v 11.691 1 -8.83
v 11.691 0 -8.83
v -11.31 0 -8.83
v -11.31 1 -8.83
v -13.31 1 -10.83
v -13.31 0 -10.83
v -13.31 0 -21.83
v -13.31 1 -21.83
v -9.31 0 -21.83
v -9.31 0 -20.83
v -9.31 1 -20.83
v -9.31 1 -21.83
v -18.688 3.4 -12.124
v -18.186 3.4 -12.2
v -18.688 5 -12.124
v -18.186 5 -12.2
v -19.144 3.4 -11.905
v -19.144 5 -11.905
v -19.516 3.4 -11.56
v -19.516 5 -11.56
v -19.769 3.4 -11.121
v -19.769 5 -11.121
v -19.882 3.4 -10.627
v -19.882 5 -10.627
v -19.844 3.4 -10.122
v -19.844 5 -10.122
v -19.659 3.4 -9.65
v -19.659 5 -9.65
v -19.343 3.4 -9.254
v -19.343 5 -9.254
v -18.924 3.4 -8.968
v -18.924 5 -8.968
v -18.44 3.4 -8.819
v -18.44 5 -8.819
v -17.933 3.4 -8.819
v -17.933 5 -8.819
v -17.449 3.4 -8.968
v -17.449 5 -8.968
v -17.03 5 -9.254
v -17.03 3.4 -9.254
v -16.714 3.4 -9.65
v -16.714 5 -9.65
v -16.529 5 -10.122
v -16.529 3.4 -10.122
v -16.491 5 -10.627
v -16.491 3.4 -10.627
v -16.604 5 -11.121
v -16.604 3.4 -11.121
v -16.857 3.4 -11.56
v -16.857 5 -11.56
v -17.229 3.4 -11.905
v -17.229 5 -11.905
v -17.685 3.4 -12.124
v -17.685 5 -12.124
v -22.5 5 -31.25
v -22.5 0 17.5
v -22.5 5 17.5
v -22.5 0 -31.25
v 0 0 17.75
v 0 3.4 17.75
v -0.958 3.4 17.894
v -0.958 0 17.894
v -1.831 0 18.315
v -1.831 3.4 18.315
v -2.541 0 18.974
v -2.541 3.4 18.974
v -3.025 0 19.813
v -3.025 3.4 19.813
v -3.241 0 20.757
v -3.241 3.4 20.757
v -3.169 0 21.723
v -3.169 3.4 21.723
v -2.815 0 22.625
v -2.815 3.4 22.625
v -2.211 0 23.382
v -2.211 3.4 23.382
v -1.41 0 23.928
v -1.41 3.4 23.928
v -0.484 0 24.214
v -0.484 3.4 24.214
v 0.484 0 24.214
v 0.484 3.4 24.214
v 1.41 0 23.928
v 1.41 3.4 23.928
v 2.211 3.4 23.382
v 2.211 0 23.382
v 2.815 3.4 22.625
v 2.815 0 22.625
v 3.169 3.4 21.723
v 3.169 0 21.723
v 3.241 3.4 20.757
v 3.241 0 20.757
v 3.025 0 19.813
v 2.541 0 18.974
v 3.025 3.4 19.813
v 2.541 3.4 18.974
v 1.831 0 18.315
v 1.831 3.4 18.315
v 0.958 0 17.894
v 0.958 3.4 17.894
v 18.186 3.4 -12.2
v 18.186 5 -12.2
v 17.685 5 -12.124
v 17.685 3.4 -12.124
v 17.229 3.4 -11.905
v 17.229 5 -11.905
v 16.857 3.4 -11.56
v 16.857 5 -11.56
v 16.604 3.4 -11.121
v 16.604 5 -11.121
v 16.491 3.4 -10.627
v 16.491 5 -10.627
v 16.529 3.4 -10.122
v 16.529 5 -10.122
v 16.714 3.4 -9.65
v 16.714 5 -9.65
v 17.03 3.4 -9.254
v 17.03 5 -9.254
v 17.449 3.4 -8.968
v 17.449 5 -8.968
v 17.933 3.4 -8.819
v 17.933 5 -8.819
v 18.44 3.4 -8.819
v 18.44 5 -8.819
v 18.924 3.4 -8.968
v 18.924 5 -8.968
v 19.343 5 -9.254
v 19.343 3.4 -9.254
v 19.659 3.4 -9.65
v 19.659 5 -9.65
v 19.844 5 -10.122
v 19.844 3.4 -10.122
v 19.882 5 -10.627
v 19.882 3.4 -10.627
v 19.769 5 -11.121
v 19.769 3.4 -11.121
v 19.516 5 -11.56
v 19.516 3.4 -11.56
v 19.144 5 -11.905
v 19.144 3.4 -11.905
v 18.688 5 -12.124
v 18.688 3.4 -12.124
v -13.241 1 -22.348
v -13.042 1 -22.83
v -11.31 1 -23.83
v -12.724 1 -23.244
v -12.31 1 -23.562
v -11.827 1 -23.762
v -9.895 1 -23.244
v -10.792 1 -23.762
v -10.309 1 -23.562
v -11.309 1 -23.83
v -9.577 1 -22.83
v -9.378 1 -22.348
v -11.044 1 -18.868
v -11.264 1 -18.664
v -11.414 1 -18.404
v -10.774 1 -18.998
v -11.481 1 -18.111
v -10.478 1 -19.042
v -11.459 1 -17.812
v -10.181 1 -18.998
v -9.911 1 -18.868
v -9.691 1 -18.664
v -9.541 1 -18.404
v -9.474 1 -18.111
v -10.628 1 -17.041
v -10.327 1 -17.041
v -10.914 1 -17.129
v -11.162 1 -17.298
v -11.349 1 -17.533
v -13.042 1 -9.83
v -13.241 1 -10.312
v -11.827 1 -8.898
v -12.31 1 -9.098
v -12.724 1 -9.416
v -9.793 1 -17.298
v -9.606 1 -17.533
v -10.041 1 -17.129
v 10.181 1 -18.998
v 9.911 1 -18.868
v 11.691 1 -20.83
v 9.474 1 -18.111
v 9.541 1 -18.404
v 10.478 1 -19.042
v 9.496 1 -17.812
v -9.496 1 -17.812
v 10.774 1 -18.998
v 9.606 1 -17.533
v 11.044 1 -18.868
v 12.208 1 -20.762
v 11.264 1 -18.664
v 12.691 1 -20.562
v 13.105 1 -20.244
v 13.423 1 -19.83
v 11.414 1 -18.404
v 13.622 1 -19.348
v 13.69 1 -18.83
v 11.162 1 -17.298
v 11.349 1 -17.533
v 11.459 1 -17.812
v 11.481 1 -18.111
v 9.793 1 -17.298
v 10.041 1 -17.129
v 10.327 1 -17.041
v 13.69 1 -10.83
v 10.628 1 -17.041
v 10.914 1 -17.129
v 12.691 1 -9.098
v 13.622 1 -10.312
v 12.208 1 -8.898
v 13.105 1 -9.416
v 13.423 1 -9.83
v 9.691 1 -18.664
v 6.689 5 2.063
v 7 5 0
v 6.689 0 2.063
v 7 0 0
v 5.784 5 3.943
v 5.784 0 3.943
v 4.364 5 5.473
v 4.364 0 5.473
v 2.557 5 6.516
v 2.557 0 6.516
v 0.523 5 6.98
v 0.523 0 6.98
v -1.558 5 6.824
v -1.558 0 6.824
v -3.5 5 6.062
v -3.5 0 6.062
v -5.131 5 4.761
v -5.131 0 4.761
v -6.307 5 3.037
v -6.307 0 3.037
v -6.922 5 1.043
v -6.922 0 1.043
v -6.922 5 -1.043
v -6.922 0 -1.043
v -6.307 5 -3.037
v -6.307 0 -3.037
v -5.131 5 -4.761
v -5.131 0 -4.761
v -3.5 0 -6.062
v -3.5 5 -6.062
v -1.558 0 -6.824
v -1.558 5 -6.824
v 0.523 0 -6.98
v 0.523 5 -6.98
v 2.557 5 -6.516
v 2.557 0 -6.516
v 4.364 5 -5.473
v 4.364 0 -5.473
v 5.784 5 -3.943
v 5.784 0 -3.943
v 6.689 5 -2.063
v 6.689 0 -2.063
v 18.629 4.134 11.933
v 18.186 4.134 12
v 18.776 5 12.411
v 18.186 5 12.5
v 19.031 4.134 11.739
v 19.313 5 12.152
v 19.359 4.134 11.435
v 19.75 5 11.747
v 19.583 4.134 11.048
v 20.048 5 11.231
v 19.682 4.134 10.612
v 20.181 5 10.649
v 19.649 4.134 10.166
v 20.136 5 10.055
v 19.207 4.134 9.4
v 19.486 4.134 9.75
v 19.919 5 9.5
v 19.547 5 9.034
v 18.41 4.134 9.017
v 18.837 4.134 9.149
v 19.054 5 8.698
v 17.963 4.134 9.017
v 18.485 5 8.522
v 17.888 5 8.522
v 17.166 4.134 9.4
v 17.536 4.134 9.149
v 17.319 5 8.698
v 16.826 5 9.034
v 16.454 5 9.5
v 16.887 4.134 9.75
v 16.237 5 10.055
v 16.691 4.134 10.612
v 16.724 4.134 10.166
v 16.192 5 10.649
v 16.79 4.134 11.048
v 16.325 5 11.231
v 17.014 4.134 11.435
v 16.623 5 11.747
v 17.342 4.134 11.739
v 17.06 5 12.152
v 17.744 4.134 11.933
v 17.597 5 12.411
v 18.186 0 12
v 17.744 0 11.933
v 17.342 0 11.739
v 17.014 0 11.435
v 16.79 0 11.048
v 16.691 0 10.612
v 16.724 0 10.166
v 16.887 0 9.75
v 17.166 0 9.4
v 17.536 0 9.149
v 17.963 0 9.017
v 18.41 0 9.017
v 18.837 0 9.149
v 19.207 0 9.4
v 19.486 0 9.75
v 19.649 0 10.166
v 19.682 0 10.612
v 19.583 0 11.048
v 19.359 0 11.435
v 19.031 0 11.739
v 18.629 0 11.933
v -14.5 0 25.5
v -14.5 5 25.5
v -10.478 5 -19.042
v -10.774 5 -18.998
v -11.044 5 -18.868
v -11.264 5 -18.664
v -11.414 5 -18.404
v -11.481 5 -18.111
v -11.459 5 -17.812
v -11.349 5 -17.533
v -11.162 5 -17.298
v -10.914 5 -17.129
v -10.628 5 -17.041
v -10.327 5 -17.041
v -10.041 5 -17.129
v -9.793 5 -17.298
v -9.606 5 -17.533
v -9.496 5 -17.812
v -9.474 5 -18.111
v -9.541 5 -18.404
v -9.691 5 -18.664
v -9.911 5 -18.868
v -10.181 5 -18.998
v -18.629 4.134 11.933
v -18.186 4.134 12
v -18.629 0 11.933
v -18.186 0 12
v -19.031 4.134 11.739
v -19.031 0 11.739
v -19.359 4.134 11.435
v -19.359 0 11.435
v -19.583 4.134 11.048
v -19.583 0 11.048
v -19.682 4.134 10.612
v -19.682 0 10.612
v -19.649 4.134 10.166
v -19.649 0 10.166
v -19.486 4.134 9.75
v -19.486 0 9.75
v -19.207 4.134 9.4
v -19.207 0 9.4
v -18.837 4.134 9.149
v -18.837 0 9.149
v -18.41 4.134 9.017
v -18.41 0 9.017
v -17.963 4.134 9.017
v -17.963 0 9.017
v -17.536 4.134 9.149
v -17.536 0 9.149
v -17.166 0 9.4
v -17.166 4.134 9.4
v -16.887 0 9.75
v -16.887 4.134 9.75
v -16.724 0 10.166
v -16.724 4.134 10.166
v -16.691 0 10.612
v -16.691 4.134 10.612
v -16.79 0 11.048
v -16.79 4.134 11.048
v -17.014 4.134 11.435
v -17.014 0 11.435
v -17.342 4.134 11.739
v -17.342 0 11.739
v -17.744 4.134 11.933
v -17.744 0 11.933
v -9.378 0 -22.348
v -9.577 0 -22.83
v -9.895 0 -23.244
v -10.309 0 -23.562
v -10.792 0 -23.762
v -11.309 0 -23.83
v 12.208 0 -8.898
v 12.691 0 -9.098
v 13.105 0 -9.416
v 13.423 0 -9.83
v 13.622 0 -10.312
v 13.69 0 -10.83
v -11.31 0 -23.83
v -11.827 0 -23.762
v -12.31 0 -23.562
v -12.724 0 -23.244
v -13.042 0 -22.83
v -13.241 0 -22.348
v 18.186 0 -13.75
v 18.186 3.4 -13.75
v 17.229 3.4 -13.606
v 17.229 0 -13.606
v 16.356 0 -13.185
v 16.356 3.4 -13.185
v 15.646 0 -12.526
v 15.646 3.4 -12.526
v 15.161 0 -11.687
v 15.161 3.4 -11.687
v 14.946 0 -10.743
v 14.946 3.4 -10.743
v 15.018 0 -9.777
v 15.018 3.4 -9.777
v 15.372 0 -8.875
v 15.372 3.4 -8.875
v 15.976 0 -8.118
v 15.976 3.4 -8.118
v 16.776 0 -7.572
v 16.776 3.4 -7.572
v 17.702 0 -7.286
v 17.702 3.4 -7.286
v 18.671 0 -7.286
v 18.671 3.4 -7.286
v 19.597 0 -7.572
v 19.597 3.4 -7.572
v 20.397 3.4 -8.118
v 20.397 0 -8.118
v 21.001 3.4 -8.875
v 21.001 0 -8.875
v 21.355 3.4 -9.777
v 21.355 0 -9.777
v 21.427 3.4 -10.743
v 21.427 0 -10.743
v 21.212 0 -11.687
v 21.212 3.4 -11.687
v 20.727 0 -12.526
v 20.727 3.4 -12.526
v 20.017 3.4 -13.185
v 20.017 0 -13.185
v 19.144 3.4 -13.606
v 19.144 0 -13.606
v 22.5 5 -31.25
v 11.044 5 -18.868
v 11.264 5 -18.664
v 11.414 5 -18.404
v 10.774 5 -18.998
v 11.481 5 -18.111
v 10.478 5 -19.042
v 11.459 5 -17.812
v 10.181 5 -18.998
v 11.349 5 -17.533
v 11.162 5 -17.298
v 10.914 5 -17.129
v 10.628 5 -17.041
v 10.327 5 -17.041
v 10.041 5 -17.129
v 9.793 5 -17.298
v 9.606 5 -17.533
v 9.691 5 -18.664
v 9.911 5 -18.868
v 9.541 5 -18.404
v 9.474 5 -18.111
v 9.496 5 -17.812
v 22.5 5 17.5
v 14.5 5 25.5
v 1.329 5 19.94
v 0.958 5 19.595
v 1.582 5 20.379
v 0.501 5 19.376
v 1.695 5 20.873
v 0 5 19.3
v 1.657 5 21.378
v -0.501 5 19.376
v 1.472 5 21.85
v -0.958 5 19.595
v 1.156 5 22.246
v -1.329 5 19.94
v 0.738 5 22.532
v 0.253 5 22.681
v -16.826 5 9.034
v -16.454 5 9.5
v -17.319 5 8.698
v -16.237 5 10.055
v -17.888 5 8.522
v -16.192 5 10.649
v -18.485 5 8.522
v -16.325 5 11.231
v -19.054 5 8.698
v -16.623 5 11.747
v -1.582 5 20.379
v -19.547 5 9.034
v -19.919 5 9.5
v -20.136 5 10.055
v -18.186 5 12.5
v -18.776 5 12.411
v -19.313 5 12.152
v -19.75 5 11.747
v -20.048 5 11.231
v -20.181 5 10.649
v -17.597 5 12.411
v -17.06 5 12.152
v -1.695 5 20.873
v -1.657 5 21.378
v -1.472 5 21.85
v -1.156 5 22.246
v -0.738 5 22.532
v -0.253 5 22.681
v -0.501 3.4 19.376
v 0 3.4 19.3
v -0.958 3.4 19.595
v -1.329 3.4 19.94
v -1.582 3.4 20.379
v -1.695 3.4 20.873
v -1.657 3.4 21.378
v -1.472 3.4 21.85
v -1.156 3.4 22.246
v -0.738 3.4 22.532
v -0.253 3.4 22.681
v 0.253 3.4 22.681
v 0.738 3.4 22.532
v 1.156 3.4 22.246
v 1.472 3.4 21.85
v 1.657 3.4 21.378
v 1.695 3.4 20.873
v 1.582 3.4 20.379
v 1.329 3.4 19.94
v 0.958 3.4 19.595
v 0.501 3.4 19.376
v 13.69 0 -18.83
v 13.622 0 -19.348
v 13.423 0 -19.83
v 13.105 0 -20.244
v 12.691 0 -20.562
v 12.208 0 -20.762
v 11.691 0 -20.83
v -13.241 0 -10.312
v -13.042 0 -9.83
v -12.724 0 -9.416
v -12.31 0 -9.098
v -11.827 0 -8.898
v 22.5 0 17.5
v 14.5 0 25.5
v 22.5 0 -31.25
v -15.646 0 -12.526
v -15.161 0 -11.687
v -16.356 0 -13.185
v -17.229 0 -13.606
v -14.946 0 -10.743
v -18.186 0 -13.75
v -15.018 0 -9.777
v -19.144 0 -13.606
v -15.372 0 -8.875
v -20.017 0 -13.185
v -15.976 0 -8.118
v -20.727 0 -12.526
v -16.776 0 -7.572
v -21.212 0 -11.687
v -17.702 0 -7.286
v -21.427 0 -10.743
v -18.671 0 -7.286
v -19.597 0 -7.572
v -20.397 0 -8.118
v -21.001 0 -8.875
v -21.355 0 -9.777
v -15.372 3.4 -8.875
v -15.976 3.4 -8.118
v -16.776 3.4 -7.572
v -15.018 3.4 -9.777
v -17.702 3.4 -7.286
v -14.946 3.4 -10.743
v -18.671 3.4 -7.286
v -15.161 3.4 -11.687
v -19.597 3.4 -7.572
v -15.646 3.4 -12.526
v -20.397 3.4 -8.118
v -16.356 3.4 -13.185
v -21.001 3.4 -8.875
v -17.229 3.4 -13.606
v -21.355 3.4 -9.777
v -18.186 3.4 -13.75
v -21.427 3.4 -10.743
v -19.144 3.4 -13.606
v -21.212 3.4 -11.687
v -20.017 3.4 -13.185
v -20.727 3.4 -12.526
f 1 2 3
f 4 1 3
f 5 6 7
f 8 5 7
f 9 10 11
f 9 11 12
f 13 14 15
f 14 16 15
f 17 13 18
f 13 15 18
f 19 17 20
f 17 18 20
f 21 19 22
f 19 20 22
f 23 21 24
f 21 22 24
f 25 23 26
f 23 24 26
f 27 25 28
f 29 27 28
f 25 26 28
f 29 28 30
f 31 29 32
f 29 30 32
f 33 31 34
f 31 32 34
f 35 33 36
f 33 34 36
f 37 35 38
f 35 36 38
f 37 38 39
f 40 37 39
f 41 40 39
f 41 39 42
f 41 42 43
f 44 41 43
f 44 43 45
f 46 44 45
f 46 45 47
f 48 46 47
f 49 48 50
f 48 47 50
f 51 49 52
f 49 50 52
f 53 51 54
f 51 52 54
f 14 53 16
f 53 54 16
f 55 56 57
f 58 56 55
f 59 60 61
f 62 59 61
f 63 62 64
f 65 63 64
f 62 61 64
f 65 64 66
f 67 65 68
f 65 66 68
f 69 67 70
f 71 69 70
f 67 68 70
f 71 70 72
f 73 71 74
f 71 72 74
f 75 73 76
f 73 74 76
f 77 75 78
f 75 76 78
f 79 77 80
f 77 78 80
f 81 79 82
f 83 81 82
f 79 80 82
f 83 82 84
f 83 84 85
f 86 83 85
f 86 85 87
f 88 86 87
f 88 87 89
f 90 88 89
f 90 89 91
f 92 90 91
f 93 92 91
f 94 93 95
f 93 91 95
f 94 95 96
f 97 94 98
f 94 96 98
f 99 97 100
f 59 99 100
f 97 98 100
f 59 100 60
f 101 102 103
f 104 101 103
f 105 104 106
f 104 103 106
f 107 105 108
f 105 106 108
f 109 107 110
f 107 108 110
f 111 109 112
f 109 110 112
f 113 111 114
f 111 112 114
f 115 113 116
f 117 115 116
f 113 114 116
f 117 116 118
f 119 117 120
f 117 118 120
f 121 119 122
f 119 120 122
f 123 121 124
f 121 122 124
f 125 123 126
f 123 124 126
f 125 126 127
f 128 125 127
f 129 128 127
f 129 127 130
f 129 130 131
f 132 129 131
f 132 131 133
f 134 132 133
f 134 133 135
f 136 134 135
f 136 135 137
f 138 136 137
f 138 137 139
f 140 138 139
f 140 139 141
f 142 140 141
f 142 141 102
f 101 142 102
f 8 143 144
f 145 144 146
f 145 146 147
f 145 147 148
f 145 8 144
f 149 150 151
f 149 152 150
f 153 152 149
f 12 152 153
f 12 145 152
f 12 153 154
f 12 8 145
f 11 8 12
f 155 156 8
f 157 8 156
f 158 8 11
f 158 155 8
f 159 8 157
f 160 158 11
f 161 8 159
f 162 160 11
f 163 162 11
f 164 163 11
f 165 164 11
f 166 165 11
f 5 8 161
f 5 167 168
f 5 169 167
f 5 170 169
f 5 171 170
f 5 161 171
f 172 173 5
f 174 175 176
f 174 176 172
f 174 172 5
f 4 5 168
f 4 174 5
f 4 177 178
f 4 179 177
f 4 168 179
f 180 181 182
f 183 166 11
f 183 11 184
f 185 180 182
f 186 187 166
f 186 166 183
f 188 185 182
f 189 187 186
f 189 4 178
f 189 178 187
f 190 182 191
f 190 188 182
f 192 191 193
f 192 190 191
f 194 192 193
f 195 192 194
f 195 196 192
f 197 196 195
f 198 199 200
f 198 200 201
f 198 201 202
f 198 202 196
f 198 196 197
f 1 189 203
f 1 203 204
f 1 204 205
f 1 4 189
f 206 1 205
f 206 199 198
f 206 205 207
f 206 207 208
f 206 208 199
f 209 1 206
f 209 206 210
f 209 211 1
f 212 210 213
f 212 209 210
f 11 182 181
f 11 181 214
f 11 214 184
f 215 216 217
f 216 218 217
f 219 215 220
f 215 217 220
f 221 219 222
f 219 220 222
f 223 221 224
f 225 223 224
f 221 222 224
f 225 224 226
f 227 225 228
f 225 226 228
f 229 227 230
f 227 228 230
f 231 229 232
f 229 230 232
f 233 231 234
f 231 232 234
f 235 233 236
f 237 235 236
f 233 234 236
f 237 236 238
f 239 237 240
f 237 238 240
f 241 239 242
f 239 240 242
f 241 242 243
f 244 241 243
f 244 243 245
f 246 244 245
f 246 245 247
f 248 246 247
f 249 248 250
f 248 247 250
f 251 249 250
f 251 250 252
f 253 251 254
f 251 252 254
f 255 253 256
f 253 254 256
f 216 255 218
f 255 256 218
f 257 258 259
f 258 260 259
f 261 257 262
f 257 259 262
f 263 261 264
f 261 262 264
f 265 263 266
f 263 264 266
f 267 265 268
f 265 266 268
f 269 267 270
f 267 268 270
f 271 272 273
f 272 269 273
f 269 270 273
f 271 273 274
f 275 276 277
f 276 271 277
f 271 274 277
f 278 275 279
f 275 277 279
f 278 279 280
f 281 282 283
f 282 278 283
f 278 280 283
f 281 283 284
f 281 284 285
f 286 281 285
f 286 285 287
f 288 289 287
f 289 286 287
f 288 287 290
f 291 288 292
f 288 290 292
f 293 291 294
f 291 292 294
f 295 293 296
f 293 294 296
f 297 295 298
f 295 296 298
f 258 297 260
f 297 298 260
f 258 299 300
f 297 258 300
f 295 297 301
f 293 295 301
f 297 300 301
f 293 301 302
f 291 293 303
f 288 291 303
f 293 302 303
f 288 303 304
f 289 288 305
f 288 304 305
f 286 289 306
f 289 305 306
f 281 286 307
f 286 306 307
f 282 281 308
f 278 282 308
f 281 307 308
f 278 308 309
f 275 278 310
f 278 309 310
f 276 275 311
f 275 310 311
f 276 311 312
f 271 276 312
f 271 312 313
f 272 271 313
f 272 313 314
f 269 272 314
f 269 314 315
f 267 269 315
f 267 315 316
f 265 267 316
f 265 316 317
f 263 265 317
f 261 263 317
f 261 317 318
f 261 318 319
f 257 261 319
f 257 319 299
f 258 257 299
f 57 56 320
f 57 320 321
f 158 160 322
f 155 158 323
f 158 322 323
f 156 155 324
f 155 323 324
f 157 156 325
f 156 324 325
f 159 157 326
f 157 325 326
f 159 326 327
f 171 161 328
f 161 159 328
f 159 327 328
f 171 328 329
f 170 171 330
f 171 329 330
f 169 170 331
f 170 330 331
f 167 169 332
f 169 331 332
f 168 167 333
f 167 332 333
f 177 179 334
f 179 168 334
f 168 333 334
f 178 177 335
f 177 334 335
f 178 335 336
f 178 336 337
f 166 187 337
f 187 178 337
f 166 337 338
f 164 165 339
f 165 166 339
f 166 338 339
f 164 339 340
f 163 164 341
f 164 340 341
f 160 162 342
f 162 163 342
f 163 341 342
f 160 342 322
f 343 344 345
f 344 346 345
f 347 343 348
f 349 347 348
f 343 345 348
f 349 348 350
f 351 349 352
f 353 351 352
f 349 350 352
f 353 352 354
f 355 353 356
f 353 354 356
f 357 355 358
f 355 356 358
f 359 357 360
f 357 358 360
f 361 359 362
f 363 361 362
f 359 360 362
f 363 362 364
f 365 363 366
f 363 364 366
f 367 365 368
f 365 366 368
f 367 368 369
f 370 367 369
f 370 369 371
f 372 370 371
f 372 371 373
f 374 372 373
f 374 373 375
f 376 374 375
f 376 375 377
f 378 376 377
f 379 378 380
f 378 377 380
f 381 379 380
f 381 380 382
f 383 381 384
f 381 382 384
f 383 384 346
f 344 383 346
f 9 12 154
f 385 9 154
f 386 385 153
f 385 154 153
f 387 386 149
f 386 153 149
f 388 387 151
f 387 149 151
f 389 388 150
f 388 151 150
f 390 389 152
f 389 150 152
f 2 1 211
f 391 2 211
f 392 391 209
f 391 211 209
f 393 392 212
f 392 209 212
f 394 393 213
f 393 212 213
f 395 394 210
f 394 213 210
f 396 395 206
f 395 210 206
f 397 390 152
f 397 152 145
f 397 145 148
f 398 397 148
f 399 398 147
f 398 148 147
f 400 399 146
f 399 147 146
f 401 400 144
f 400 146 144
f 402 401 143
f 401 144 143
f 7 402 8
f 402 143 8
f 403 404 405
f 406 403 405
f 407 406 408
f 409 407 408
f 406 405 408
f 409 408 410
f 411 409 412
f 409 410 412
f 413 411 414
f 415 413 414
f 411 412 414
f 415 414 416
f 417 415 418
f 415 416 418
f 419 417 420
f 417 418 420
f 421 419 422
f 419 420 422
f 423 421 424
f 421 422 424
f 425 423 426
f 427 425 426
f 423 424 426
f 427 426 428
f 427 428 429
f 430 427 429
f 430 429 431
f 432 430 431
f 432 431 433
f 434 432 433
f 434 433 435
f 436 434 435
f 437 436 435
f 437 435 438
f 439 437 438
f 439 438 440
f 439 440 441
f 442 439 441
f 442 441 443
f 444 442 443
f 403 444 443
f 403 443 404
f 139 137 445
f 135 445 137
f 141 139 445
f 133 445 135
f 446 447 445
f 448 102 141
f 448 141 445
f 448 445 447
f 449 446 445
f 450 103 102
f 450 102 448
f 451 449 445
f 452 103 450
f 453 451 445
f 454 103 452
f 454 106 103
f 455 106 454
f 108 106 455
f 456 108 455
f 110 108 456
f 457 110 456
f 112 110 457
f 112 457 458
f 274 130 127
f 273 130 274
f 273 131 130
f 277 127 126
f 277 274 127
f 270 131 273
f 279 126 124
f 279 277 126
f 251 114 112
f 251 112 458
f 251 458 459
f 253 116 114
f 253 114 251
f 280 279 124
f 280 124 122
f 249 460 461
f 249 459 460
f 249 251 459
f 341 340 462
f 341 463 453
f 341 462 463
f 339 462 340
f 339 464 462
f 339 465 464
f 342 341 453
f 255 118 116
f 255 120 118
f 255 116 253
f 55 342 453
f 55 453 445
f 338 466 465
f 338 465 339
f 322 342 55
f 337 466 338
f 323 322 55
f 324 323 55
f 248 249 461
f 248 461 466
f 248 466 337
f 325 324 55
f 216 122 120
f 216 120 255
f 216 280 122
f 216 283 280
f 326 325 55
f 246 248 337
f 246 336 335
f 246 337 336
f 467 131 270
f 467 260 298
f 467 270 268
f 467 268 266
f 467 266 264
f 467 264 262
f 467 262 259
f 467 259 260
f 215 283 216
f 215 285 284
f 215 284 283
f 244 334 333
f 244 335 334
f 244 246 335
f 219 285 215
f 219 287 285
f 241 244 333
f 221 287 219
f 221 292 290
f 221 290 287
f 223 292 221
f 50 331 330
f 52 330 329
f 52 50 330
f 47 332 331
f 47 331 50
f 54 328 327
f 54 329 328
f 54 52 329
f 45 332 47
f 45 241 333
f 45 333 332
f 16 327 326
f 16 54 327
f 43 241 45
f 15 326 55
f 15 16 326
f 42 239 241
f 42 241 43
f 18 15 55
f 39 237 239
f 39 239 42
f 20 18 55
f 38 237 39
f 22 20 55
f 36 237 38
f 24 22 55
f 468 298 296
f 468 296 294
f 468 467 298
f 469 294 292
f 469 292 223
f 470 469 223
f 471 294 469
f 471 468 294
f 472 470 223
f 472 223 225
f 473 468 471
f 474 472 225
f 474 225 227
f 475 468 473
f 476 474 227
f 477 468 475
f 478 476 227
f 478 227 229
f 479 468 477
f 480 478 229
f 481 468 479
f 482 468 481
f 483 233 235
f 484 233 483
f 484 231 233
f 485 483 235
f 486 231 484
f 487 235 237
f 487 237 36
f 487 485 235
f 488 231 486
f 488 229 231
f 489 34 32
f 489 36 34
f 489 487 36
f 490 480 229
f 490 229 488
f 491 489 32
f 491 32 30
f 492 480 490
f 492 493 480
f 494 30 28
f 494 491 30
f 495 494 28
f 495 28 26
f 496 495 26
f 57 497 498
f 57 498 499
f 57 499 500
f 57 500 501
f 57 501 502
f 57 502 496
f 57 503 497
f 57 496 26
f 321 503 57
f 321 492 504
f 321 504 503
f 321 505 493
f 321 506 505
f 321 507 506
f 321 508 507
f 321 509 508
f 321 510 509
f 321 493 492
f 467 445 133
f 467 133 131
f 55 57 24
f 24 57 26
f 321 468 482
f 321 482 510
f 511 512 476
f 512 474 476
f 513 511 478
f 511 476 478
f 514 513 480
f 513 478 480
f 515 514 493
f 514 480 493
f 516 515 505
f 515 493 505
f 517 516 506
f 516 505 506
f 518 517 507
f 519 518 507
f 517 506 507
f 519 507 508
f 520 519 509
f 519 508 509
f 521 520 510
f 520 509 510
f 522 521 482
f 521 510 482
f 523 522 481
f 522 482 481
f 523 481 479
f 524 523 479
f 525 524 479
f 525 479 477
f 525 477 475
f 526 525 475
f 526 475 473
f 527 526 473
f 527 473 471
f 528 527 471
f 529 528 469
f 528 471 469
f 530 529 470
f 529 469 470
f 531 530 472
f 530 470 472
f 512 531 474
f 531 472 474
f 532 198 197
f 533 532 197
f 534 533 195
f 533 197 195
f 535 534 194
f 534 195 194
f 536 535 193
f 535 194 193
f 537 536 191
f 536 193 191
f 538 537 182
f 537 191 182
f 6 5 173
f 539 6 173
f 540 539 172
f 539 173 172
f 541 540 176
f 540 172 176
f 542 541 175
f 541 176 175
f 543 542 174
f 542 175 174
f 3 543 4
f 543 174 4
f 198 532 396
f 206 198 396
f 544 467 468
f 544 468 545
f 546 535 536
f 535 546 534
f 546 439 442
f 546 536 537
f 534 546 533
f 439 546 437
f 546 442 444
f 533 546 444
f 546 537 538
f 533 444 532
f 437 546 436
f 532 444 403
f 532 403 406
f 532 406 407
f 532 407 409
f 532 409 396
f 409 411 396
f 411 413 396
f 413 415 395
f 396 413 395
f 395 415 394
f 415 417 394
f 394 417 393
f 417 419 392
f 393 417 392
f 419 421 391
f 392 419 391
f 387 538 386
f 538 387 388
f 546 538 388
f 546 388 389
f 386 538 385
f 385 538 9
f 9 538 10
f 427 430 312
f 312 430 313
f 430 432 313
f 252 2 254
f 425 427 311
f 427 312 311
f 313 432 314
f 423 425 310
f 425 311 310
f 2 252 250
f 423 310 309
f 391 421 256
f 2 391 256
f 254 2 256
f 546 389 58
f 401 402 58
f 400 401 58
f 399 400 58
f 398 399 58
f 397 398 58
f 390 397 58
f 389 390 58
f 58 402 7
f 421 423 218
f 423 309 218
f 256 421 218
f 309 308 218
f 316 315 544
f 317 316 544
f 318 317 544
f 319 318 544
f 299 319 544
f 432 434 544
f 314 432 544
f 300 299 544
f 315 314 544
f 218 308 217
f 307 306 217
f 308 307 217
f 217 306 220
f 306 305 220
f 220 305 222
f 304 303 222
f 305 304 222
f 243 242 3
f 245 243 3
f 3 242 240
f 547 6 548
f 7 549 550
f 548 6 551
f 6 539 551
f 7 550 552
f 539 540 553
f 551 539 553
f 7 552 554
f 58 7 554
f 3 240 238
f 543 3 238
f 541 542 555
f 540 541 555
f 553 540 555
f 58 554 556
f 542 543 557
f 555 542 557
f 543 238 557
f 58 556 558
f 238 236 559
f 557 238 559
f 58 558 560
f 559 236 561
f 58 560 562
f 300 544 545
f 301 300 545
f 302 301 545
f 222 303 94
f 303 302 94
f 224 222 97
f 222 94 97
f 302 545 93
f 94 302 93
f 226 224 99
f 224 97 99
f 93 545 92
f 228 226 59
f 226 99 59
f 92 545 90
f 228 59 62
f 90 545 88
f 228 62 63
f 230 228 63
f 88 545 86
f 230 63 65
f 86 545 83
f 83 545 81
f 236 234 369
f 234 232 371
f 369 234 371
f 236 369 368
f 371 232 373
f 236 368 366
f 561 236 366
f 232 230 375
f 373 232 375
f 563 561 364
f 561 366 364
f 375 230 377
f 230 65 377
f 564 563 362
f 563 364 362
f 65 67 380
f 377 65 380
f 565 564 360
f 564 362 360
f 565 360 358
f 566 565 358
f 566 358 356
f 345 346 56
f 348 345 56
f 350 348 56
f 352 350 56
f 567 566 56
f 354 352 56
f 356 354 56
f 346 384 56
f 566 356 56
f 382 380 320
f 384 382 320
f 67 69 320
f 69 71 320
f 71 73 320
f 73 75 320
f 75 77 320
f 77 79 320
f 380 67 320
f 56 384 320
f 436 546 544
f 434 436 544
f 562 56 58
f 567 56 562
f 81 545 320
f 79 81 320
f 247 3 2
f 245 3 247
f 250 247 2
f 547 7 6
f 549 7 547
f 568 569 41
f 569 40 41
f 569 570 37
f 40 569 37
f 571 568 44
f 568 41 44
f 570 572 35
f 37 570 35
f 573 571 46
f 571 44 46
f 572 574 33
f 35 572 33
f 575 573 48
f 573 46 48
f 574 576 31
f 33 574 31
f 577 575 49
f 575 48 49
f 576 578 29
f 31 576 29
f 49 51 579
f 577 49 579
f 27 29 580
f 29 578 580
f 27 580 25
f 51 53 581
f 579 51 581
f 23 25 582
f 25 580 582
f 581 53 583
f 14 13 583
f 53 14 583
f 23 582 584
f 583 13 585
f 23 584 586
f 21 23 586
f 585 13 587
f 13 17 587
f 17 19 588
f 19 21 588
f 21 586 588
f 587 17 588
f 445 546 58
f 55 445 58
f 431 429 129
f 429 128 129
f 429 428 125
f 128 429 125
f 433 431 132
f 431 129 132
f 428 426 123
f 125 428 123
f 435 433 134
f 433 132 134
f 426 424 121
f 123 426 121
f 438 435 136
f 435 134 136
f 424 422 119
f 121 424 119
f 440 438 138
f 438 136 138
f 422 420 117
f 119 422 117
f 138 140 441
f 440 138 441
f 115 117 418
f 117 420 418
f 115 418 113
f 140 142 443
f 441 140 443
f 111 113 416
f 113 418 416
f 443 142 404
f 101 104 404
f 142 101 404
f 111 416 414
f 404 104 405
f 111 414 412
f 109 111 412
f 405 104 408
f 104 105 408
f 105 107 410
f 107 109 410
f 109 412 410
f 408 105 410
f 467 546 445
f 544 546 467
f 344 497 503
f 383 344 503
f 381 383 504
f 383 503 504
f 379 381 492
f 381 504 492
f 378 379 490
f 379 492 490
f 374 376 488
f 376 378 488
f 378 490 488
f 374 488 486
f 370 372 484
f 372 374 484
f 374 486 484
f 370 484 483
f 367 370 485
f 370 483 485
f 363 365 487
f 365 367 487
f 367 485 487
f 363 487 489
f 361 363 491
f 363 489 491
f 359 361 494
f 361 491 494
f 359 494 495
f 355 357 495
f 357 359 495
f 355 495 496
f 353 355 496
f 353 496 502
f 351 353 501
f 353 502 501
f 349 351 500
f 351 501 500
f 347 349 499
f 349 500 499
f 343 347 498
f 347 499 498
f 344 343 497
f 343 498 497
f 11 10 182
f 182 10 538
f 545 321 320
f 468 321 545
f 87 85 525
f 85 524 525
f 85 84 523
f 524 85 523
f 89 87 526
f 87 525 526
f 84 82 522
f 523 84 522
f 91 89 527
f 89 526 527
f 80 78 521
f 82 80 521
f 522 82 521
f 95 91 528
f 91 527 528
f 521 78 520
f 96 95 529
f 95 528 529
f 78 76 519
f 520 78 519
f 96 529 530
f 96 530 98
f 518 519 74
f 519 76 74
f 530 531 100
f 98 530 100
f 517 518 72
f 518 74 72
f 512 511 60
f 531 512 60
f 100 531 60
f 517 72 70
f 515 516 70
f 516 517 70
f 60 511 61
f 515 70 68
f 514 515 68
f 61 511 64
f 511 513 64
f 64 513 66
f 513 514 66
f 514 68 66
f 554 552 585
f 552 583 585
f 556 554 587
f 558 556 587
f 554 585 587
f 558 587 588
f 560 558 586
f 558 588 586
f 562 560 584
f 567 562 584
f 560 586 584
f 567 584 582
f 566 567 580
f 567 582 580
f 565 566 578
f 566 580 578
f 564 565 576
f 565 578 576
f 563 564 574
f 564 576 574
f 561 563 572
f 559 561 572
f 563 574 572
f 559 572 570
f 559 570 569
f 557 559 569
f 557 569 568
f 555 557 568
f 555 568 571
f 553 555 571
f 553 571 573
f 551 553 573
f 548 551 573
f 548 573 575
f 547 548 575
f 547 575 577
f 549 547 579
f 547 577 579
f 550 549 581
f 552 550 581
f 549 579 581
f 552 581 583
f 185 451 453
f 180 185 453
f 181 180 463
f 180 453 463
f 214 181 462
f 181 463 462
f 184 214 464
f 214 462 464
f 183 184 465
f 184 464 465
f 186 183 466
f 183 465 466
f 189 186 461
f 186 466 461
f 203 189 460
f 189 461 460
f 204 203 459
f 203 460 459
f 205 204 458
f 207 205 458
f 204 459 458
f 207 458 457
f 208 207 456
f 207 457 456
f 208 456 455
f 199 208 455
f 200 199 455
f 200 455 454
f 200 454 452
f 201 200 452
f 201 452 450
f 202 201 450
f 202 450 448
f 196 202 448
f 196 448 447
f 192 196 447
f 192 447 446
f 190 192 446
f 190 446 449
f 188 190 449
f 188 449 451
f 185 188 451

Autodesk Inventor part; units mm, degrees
ref_plane "YZ Plane" through (0, 0, 0) normal (1, 0, 0) x (0, 1, 0)
ref_plane "XZ Plane" through (0, 0, 0) normal (0, 1, 0) x (-1, 0, 0)
ref_plane "XY Plane" through (0, 0, 0) normal (0, 0, 1) x (1, 0, 0)
sketch "Sketch1" plane through (0, 0, 0) normal (0, 1, 0) x (-1, 0, 0)
  line L0 (-22.5, 28.5) -> (22.5, 28.5)
  line L1 (22.5, 28.5) -> (22.5, -28.5)
  line L2 (22.5, -28.5) -> (-22.5, -28.5)
  line L3 (-22.5, -28.5) -> (-22.5, 28.5)
  line L4 (-22.5, 28.5) -> (22.5, -28.5) construction
  line L5 (22.5, 28.5) -> (-22.5, -28.5) construction
  circle A0 centre (0, 0) radius 21 construction
  line L6 (0, -43.2) -> (0, 40.45) projected
  line L7 (22.5, -28.5) -> (-22.5, -28.5)
  line L8 (-22.5, -28.5) -> (-22.5, -31.25)
  line L9 (-22.5, -31.25) -> (22.5, -31.25)
  line L10 (22.5, -31.25) -> (22.5, -28.5)
  point P0 (0, 21)
  point P1 (-18.1865, -10.5)
  point P2 (18.1865, -10.5)
  dimension "d2" = 42
  dimension "d0" = 45
  dimension "d1" = 57
  dimension "d5" = 360
  dimension "d62" = 2.75
extrude "Extrusion1" add sketch "Sketch1" along normal blind 5
hole "Hole1" at (0, 0, 21) at (18.1865, 0, -10.5) at (-18.1865, 0, -10.5) direction (0, 1, 0) diameter 3.4 depth 8.8 tip angle 118 counterbore diameter 6.5 counterbore depth 3.4 clearance for "Socket Head Cap Screw ISO 4762" size "M3" standard "ISO"
sketch "Sketch2" plane through (0, 0, 0) normal (0, -1, 0) x (1, 0, 0)
  circle A0 centre (0, 0) radius 7
  dimension "d16" = 14
extrude "Extrusion2" cut sketch "Sketch2" against normal through all
sketch "Sketch3" plane through (0, 5, 0) normal (0, 1, 0) x (1, 0, 0)
  circle A0 centre (0, 0) radius 21 construction
  point P0 (18.1865, -10.5)
  point P1 (0, 21)
  point P2 (-18.1865, -10.5)
  dimension "d19" = 42
  dimension "d22" = 360
hole "Hole2" at (18.1865, 5, 10.5) at (-18.1865, 5, 10.5) direction (0, -1, 0) diameter 3 depth 8.8 tip angle 118
chamfer "Chamfer1" distance 0.5 angle 60 2 edges at (-18.1865, 5, 9) (18.1865, 5, 9) measured on face at (-0.2813, 5, -23.1497)
sketch "Sketch5" plane through (0, 0, 0) normal (0, -1, 0) x (1, 0, 0)
  line L0 (-13.3095, -20.83) -> (13.6905, -20.83)
  line L1 (13.6905, -20.83) -> (13.6905, -8.83)
  line L2 (13.6905, -8.83) -> (-13.3095, -8.83)
  line L3 (-13.3095, -8.83) -> (-13.3095, -20.83)
  line L4 (-13.3095, -20.83) -> (13.6905, -8.83) construction
  line L5 (13.6905, -20.83) -> (-13.3095, -8.83) construction
  line L6 (0, -36.4441) -> (0, 10.0043) construction
  circle A0 centre (0, 0) radius 7 projected
  point P0 (0.1905, -14.83)
  point P1 (3.4689, -6.08)
  point P2 (-3.4689, -6.08)
  dimension "d34" = 12
  dimension "d35" = 27
  dimension "d36" = 13.3095
  dimension "d38" = 20.83
extrude "Extrusion3" cut sketch "Sketch5" against normal blind 1 contours L3 L2 L1 L0
sketch "Sketch6" plane through (0, 1, 0) normal (0, -1, 0) x (1, 0, 0)
  circle A0 centre (-10.4775, -18.036) radius 1.1414 construction
  line L0 (-13.3095, -20.83) -> (-13.3095, -8.83) projected
  line L1 (13.6905, -20.83) -> (-13.3095, -20.83) projected
  circle A1 centre (10.4775, -18.036) radius 1.164 construction
  line L2 (-10.4775, -18.036) -> (12.0154, -18.036) construction
  point P0 (0, 0)
  dimension "d41" = 2.832
  dimension "d42" = 2.794
  dimension "d43" = 20.955
hole "Hole3" at (10.4775, 1, -18.036) at (-10.4775, 1, -18.036) direction (0, 1, 0) diameter 2.013 depth 7.6 tip angle 118 thread size "M2.5x0.45" class "6H" standard "ISO Metric profile"
sketch "Sketch7" plane through (0, 0, 0) normal (0, -1, 0) x (1, 0, 0)
  line L0 (13.6905, -20.83) -> (-13.3095, -20.83) projected
  circle A0 centre (-11.3095, -20.83) radius 2
  line L1 (-13.3095, -20.83) -> (-13.3095, -8.83) projected
  line L2 (-9.3095, -20.83) -> (-9.3095, -23.83)
  line L3 (-13.3095, -20.83) -> (-13.3095, -23.83)
  line L4 (-9.3095, -23.83) -> (-13.3095, -23.83)
  line L5 (22.5, -31.25) -> (-22.5, -31.25) projected
  point P0 (0, 0)
  point P1 (-9.3095, -18.08)
  point P2 (-13.3095, -20.83)
  dimension "d51" = 4
  dimension "d63" = 3
extrude "Extrusion4" cut sketch "Sketch7" against normal blind 1
sketch "Sketch8" plane through (-22.5, 0, 28.5) normal (0, 0, 1) x (1, 0, 0)
  line L0 (25.75, 3.4) -> (19.25, 3.4) projected
  line L1 (0, 0) -> (45, 0) projected
  line L2 (45, 0) -> (45, 5) projected
  line L3 (0, 5) -> (45, 5) projected
  line L4 (0, 0) -> (0, 5) projected
  point P0 (22.5, 0)
extrude "Extrusion5" cut sketch "Sketch8" against normal blind 3
fillet "Fillet1" radius 2 5 edges at (13.6905, 0.5, -20.83) (13.6905, 0.5, -8.83) (-13.3095, 0.5, -8.83) (-9.3095, 0.5, -23.83) (-13.3095, 0.5, -23.83)
sketch "Sketch11" plane through (0, 5, 0) normal (0, 1, 0) x (1, 0, 0)
  point P0 (0, 0)
chamfer "Chamfer3" distance 8 angle 45 2 edges at (22.5, 2.5, 25.5) (-22.5, 2.5, 25.5)
properties part number "encoder mount"
